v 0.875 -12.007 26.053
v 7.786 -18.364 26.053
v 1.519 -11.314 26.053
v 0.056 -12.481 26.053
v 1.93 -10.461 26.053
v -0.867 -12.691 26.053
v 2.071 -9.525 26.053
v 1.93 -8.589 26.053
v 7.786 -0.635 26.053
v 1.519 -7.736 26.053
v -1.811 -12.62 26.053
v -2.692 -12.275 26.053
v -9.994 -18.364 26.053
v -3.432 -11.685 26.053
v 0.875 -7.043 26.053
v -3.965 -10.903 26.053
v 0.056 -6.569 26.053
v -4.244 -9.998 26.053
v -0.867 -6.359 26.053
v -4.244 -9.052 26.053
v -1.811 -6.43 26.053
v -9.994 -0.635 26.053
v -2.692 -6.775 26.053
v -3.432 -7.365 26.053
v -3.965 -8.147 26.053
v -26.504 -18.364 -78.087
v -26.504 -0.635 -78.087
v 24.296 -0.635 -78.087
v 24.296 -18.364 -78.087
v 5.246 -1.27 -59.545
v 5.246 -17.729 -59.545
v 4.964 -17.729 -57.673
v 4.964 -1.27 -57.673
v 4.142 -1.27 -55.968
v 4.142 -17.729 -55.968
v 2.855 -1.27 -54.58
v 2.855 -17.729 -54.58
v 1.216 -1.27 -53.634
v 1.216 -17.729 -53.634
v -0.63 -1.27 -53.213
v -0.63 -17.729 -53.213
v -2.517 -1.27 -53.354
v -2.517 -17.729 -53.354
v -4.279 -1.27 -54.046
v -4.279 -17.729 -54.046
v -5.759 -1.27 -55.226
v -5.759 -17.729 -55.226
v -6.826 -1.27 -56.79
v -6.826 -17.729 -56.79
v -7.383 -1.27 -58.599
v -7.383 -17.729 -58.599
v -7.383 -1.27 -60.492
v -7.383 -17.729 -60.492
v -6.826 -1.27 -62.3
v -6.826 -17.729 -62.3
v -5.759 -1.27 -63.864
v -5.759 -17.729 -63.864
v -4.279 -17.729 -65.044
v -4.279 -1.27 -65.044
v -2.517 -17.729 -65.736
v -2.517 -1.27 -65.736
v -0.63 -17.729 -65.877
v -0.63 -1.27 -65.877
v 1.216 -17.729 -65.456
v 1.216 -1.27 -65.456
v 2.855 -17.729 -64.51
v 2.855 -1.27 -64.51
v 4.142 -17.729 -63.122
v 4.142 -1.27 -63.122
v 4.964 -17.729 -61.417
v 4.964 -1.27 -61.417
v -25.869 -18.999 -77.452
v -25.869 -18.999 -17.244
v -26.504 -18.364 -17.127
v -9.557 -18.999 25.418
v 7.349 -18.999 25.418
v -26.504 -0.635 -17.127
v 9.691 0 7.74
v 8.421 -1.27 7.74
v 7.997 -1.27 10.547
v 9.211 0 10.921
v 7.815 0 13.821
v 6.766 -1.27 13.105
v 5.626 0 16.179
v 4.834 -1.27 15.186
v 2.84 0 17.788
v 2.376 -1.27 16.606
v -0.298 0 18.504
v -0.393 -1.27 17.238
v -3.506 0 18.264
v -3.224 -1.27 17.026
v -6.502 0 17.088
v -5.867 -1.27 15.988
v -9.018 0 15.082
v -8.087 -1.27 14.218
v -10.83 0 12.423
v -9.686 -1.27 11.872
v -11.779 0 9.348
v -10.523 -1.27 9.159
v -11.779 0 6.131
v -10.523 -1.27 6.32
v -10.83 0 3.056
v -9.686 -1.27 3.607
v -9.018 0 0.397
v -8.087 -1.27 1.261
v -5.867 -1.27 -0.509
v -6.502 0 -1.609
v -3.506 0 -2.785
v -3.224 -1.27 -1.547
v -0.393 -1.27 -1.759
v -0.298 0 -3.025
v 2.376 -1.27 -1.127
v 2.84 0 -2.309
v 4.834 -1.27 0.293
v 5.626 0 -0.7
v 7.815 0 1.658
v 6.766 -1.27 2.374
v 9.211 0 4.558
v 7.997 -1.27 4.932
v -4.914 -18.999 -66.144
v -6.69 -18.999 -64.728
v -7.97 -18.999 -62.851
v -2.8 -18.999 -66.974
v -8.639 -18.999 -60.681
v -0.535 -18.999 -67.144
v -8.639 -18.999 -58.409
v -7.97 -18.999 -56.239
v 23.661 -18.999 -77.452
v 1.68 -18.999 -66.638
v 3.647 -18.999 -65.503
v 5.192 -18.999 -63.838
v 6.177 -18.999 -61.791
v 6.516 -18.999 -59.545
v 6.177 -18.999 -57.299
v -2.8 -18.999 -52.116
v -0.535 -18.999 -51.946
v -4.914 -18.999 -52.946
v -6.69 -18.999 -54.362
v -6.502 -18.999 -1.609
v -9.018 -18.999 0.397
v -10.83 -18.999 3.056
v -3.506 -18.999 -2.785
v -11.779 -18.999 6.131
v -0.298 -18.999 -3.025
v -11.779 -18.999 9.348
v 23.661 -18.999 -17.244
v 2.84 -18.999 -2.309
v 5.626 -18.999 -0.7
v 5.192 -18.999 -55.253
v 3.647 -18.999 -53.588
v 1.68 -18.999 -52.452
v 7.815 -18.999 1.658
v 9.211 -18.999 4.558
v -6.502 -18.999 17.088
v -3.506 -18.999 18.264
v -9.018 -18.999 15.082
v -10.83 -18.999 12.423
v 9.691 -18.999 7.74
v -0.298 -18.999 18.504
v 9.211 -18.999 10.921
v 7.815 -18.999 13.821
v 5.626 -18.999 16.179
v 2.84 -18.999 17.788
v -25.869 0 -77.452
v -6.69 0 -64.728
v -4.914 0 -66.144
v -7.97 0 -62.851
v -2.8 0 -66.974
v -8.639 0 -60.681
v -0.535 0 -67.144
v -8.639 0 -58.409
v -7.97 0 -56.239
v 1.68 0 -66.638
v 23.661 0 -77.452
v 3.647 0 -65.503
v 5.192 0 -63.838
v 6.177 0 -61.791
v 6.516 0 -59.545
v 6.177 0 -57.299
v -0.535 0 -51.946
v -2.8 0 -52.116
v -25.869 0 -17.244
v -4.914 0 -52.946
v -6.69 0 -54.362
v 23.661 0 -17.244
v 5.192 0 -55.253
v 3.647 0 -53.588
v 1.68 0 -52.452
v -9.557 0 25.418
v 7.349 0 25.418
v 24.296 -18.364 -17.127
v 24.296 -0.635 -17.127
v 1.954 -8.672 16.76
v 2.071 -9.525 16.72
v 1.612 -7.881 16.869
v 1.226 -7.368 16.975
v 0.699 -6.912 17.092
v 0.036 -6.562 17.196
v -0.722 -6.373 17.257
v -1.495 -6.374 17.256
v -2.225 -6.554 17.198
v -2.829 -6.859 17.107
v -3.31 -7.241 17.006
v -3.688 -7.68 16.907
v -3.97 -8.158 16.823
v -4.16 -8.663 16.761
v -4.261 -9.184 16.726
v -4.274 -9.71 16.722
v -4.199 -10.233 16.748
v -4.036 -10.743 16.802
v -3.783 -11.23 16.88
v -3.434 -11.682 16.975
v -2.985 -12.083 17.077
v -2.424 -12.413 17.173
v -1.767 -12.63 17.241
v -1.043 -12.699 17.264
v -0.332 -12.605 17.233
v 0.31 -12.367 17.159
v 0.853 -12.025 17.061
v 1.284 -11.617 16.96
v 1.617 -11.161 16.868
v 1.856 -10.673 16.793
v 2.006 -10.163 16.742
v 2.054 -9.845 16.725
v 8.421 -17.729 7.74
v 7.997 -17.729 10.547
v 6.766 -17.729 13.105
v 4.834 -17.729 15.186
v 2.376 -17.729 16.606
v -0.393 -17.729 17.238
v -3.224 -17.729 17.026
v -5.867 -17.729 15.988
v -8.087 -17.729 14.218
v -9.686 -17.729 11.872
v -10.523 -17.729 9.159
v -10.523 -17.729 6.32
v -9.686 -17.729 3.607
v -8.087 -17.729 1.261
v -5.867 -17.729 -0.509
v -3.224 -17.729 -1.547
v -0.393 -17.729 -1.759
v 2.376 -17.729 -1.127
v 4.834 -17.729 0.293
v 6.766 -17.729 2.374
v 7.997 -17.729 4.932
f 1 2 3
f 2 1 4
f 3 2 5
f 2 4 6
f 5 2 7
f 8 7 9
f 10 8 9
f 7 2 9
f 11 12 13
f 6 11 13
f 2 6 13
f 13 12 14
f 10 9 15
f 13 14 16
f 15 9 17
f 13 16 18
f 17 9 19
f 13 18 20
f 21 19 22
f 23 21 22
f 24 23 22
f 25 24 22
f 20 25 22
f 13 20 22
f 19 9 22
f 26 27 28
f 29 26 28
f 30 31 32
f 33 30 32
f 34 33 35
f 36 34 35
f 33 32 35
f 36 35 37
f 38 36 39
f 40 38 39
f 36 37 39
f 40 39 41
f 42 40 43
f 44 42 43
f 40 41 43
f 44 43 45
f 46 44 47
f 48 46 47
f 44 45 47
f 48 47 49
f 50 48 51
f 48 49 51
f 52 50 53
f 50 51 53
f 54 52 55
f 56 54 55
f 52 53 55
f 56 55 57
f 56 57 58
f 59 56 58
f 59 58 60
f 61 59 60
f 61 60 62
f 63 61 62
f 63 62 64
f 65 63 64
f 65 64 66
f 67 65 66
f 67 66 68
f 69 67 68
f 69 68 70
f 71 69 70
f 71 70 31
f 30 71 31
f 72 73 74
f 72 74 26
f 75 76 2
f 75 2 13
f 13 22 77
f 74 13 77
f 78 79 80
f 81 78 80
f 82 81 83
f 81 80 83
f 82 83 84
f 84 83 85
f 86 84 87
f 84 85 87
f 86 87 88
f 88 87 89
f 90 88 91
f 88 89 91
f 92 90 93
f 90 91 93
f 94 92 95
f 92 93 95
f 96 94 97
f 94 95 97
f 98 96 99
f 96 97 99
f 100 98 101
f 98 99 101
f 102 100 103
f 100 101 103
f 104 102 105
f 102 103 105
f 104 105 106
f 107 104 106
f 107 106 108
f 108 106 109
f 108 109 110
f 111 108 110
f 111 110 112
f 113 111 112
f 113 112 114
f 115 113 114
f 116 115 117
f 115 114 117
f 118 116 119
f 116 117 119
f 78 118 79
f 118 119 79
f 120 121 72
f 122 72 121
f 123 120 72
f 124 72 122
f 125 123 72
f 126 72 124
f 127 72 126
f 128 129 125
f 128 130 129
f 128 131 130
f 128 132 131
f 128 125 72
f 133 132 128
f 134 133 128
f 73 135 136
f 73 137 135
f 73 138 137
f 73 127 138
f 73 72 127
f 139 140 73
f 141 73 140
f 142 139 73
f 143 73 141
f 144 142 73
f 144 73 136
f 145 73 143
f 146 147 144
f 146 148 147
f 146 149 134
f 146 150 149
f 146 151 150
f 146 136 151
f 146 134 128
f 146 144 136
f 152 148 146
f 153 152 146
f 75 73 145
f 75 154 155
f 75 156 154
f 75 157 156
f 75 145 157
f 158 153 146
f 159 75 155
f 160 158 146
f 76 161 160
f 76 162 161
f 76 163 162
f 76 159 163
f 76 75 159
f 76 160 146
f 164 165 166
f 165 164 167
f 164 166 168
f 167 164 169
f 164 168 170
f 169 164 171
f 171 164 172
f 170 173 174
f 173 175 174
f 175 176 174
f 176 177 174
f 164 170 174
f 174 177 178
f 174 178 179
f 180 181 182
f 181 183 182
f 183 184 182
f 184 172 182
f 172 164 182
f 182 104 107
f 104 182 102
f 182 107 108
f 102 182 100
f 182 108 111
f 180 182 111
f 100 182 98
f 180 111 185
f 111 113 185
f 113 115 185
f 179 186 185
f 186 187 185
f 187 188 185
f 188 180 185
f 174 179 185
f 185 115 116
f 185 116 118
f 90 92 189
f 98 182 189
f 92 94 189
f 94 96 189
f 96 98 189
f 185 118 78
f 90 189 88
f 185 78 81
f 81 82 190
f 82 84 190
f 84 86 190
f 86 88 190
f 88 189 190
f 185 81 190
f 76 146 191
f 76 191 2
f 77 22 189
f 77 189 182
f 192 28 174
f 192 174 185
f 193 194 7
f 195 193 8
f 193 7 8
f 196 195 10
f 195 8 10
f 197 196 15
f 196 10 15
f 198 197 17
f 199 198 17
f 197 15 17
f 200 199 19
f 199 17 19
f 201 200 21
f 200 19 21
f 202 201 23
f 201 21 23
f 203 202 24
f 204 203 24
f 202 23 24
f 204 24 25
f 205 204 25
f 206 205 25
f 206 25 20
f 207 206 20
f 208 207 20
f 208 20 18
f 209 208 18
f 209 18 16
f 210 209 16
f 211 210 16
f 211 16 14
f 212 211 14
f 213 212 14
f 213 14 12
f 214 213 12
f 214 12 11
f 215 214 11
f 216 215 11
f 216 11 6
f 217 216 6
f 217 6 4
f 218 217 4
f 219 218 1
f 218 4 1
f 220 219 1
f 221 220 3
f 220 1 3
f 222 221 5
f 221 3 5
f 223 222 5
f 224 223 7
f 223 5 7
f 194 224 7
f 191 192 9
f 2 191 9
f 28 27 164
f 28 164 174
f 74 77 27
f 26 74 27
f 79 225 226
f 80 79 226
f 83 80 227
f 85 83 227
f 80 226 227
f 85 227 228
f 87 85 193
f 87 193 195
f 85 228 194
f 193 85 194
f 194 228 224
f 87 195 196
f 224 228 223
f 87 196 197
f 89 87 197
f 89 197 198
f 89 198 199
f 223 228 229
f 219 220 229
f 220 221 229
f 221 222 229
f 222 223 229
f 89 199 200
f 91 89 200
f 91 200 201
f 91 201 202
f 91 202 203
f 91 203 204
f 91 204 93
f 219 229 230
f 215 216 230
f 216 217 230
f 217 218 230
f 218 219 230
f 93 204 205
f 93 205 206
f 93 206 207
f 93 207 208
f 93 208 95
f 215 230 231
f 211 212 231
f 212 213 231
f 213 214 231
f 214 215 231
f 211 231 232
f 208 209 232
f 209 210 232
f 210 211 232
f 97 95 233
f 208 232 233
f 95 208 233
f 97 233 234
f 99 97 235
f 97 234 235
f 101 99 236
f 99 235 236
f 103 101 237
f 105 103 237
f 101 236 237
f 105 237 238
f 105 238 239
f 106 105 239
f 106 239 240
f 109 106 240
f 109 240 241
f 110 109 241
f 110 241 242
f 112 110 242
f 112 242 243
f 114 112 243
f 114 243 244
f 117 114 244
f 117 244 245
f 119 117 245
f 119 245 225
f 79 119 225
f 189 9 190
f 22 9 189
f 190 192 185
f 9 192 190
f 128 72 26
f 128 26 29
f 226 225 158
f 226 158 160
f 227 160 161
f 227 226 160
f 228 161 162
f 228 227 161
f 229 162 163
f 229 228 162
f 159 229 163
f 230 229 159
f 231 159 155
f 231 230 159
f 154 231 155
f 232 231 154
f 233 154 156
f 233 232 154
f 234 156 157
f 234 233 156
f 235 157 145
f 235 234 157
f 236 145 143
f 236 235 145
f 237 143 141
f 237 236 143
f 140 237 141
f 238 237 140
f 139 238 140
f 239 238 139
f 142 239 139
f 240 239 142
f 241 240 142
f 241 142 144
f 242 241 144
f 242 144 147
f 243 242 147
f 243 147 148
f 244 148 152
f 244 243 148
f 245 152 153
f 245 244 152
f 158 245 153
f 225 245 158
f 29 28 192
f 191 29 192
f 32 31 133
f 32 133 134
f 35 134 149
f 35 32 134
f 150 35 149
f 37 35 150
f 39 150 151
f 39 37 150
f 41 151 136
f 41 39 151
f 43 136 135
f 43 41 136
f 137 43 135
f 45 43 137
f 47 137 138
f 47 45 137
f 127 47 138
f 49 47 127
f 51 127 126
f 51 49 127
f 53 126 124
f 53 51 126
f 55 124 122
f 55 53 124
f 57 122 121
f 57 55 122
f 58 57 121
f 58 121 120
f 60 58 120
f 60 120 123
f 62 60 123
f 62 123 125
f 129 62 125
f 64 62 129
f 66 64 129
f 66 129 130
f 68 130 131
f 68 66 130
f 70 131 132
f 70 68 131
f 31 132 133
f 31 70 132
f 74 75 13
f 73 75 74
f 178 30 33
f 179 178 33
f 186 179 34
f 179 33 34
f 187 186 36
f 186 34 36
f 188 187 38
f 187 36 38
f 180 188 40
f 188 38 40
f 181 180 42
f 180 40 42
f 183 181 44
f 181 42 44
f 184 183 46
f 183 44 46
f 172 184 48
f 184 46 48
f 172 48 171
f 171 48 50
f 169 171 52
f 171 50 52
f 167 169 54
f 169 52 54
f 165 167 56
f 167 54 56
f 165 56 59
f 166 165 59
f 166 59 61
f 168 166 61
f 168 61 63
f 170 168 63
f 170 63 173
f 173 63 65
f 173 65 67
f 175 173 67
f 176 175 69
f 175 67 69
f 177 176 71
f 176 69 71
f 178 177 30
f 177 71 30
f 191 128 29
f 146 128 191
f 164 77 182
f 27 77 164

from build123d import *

# Parameters (mm, degrees)
F1_DEPTH = 18.9992
F2_R     = 9.525
F3_DEPTH = 25.4
F4_R     = 6.35
F5_DEPTH = 25.4
F6_R     = 3.175
F7_DEPTH = 12.7
F8_SIZE2 = 1.27
F8_SIZE  = 1.27
F9_SIZE  = 0.635


with BuildPart() as f1:
    # F0 (on Front) → F1 (new body)
    with BuildSketch(Plane.XZ):
        Polygon((7.785652, 26.052904), (-9.994348, 26.052904), (-26.504348, -17.127096), (-26.504348, -78.087096), (24.295652, -78.087096), (24.295652, -17.127096), align=None)
    extrude(amount=F1_DEPTH)

    # F2 (on face) → F3 (cut)
    with BuildSketch(Plane.XZ.offset(18.9992)):
        with Locations((-1.104348, 7.739504)):
            Circle(F2_R)
    extrude(amount=-F3_DEPTH, mode=Mode.SUBTRACT)

    # F4 (on face) → F5 (cut)
    with BuildSketch(Plane.XZ.offset(18.9992)):
        with Locations((-1.104348, -59.545096)):
            Circle(F4_R)
    extrude(amount=-F5_DEPTH, mode=Mode.SUBTRACT)

    # F6 (on face) → F7 (cut)
    with BuildSketch(Plane.XY.offset(26.052904)):
        with Locations((-1.104348, -9.525)):
            Circle(F6_R)
    extrude(amount=-F7_DEPTH, mode=Mode.SUBTRACT)

    # F8
    f8_edges = [f1.edges().sort_by_distance(p)[0] for p in [
        (-10.629348, -18.9992, 7.739504),
        (-7.454348, -18.9992, -59.545096),
        (-10.629348, 0, 7.739504),
        (-7.454348, 0, -59.545096),
    ]]
    chamfer(f8_edges, length=F8_SIZE, length2=F8_SIZE2)

    # F9
    f9_edges = [f1.edges().sort_by_distance(p)[0] for p in [
        (-18.249348, 0, 4.462904),
        (-26.504348, 0, -47.607096),
        (-1.104348, 0, -78.087096),
        (24.295652, 0, -47.607096),
        (16.040652, 0, 4.462904),
        (-1.104348, 0, 26.052904),
        (-26.504348, -18.9992, -47.607096),
        (-1.104348, -18.9992, -78.087096),
        (24.295652, -18.9992, -47.607096),
        (16.040652, -18.9992, 4.462904),
        (-1.104348, -18.9992, 26.052904),
        (-18.249348, -18.9992, 4.462904),
    ]]
    chamfer(f9_edges, length=F9_SIZE)


solid = f1.part
